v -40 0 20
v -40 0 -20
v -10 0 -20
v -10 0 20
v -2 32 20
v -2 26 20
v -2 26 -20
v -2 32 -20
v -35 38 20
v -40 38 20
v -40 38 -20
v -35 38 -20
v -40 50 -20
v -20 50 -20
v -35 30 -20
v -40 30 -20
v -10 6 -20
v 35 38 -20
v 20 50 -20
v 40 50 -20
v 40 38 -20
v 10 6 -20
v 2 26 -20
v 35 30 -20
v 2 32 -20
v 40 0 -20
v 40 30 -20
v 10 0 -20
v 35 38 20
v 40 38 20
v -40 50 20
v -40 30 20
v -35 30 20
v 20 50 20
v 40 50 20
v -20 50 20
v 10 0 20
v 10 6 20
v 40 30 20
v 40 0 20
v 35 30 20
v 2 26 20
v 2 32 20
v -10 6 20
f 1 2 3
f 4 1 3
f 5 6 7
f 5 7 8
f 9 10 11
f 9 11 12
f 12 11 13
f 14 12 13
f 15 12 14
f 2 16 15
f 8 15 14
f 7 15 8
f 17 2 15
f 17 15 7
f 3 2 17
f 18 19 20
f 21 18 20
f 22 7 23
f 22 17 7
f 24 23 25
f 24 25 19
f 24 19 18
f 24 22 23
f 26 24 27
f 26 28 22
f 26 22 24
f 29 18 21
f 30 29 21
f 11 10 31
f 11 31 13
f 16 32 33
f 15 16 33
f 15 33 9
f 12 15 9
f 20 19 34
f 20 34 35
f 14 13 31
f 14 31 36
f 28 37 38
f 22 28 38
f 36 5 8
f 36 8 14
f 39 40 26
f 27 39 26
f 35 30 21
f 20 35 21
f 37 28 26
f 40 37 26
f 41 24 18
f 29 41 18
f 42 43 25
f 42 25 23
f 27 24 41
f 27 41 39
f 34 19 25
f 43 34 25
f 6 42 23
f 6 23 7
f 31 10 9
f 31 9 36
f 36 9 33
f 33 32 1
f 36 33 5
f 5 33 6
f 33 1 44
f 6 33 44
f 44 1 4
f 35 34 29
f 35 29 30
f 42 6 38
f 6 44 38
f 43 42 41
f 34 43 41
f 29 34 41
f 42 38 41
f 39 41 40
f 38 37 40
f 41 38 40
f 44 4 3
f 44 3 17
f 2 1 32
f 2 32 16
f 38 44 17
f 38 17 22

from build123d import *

# Parameters (mm, degrees)
SKETCH_1_W          = 80
SKETCH_1_H          = 40
EXTRUDE_1_DEPTH     = 50
CUT_EXTRUDE_1_DEPTH = 81
SKETCH_3_W          = 20
SKETCH_3_H          = 6
CUT_EXTRUDE_2_DEPTH = 81
SKETCH_4_W          = 5
SKETCH_4_H          = 8
CUT_EXTRUDE_3_DEPTH = 81


with BuildPart() as part:
    # 草图1 → 凸台-拉伸1 (new body)
    with BuildSketch(Plane(origin=(0, 0, 0), x_dir=(1, 0, 0), z_dir=(0, 1, 0))):
        Rectangle(SKETCH_1_W, SKETCH_1_H)
    extrude(amount=EXTRUDE_1_DEPTH)

    # 草图2 → 切除-拉伸1 (cut, symmetric)
    with BuildSketch(Plane.XY):
        Polygon((-20, 50), (20, 50), (2, 32), (2, 26), (-2, 26), (-2, 32), align=None)
    extrude(amount=CUT_EXTRUDE_1_DEPTH, both=True, mode=Mode.SUBTRACT)

    # 草图3 → 切除-拉伸2 (cut, symmetric)
    with BuildSketch(Plane.XY):
        with Locations((0, 3)):
            Rectangle(SKETCH_3_W, SKETCH_3_H)
    extrude(amount=CUT_EXTRUDE_2_DEPTH, both=True, mode=Mode.SUBTRACT)

    # 草图4 → 切除-拉伸3 (cut, symmetric)
    with BuildSketch(Plane.XY):
        with Locations((-37.5, 34)):
            Rectangle(SKETCH_4_W, SKETCH_4_H)
        with Locations((37.5, 34)):
            Rectangle(SKETCH_4_W, SKETCH_4_H)
    extrude(amount=CUT_EXTRUDE_3_DEPTH, both=True, mode=Mode.SUBTRACT)


solid = part.part
